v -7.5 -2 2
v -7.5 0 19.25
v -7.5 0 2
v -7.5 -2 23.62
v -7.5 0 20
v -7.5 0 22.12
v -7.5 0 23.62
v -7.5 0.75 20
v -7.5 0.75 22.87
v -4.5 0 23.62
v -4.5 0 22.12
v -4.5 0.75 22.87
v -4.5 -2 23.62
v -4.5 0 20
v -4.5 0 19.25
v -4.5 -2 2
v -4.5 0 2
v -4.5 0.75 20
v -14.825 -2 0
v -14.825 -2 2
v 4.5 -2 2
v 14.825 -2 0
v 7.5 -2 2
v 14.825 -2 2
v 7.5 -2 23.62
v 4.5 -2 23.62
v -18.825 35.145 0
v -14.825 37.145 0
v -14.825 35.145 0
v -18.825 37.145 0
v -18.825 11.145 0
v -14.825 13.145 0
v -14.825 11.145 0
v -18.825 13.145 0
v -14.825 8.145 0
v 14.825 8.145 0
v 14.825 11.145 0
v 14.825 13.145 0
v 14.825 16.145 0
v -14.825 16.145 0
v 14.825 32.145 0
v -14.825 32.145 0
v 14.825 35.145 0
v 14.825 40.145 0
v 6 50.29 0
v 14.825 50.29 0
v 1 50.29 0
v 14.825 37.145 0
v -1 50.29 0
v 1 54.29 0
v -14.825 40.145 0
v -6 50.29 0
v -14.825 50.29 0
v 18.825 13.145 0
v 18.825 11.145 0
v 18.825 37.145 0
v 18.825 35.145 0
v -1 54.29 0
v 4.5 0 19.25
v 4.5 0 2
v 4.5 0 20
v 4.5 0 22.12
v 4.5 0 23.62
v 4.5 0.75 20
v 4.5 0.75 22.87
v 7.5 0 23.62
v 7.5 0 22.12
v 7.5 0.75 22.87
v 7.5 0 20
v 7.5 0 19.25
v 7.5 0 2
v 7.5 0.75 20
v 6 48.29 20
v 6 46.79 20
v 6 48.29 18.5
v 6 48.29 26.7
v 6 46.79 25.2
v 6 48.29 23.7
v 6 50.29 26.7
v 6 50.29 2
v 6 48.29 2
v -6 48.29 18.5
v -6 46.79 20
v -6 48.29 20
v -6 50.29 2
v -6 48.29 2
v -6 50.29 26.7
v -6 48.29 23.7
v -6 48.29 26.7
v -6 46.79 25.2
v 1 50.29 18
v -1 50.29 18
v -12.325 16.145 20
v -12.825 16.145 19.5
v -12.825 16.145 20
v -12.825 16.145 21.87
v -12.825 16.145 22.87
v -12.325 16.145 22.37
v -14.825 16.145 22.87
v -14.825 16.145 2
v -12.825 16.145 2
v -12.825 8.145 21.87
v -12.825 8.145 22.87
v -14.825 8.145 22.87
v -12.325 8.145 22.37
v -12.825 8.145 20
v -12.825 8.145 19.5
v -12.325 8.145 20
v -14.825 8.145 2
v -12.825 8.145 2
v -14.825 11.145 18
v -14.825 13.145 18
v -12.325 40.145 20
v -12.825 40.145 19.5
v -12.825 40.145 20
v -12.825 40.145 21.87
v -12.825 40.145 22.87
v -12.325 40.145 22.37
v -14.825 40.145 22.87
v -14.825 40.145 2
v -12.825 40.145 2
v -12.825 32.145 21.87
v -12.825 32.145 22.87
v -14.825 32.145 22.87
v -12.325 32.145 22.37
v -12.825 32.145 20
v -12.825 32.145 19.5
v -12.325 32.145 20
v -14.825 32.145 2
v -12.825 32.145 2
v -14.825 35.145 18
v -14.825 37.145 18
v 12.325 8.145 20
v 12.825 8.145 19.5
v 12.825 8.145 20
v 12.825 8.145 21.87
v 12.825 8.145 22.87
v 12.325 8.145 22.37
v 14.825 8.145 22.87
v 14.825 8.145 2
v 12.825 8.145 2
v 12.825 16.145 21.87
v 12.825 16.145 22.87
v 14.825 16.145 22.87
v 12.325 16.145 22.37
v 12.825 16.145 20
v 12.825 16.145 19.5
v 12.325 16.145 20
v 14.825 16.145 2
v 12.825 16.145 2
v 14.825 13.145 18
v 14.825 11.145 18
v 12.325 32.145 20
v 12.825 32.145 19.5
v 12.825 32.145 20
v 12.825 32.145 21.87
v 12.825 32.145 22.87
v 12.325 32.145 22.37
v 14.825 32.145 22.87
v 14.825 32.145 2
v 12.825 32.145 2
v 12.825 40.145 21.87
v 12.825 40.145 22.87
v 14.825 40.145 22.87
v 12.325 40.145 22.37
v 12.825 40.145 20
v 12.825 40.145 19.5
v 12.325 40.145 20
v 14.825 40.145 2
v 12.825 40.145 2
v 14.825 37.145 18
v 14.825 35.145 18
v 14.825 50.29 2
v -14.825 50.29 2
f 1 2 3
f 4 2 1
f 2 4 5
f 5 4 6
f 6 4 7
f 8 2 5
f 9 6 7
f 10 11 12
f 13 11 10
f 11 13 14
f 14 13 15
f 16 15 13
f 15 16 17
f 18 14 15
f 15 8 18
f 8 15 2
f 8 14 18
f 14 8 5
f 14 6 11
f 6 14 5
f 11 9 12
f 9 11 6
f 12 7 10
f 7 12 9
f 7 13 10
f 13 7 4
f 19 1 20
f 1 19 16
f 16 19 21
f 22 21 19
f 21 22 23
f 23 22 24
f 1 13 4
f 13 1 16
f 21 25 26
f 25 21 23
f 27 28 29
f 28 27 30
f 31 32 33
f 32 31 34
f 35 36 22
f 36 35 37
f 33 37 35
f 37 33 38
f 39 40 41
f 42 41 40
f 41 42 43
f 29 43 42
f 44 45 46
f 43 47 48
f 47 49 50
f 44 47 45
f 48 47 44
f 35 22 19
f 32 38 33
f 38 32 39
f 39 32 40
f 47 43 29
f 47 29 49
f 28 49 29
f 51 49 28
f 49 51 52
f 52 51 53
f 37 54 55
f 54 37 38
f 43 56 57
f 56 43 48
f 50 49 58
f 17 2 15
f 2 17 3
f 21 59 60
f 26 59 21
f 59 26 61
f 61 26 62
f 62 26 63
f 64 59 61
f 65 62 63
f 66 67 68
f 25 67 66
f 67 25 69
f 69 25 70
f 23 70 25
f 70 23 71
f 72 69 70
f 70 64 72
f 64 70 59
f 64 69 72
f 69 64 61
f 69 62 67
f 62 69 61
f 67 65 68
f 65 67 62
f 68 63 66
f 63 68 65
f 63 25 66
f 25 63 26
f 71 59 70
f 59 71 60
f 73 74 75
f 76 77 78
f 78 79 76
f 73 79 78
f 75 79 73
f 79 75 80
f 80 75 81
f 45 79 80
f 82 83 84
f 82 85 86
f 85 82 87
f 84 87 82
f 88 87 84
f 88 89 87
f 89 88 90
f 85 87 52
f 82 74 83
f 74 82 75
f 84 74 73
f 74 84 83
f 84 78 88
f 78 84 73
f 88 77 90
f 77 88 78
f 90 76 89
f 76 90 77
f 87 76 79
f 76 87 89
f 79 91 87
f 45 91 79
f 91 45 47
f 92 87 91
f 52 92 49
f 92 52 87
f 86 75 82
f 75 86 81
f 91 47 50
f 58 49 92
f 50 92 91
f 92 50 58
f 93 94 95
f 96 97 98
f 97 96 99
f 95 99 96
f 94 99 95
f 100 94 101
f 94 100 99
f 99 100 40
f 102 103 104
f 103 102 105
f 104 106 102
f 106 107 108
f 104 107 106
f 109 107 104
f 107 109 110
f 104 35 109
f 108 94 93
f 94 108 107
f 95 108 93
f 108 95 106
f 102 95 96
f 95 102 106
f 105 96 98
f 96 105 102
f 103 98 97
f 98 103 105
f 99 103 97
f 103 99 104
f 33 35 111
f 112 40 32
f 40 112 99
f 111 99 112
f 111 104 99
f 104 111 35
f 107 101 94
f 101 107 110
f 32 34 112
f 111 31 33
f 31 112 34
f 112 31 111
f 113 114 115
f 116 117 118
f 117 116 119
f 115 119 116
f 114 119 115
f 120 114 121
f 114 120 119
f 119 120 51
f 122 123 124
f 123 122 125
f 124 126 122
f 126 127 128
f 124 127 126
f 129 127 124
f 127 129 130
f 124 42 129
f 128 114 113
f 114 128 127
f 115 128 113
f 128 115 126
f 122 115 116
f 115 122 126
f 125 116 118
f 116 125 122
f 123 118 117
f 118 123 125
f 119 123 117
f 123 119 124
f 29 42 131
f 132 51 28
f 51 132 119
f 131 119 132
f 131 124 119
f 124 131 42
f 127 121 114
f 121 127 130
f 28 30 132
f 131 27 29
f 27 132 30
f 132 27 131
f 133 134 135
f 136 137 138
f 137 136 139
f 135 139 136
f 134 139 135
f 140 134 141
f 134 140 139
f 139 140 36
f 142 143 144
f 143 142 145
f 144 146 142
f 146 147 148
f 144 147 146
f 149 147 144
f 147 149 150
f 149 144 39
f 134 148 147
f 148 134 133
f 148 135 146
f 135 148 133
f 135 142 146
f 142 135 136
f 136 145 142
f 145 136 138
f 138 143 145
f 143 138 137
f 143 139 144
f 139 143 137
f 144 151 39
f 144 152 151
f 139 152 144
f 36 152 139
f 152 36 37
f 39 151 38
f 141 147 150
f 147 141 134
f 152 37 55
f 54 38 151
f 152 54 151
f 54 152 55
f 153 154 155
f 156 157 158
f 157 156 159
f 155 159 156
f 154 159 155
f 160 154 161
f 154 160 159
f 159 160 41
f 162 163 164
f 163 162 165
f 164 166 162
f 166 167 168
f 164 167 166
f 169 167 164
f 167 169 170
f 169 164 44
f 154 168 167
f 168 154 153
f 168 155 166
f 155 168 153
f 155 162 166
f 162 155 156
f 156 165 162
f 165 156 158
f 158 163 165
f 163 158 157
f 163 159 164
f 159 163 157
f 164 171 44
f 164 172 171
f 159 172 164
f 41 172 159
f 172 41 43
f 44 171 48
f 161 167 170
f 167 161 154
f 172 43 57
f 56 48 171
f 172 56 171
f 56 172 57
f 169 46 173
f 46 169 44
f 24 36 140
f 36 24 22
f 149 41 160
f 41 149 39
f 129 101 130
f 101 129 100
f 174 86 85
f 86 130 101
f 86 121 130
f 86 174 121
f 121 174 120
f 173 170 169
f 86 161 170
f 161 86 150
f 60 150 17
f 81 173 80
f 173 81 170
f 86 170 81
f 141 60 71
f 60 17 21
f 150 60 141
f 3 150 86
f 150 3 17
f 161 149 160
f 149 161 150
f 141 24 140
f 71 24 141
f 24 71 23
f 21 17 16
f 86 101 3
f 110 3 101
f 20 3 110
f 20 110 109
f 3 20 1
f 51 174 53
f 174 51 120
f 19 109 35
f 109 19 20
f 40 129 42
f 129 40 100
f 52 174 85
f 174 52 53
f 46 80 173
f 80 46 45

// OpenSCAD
pcbThicknessRear = 2.3;
pcbThickness = 1.47;
pcbWidth = 25.45;
pcbLength = 48.09;
rearSnapWidth = 12;
frontSnapWidth = 3;
frontSnapSpacing = 12;
sideSnapWidth = 8;
sideSnapSpacing = 12;
sideTolerance = 0.1;
thicknessTolerance = -0.1;
snapThickness = 2;
sideInset = 0.5;
frontInset = 0.75;
rearInset = 1.5;
baseThickness = 2;
snapSupportWidth = 2;
snapSupportHeight = 18;
snapSupportDepth = 4;

snapHeight = 20;

module dummy() {}

pcbWidth1 = pcbWidth + 2*sideTolerance;
pcbLength1 = pcbLength + 2*sideTolerance;
pcbThickness1 = pcbThickness + thicknessTolerance;
pcbThicknessRear1 = pcbThicknessRear + thicknessTolerance;

module snap(thickness=snapThickness,inset=2,height=snapHeight,pcbThickness=pcbThickness1,width=8,support=false) {
    translate([0,-snapThickness,0])
    rotate([0,0,90])
    translate([0,width/2,0])
    rotate([90,0,0]) {
    linear_extrude(height=width) 
        polygon([[0,0],[thickness,0],[thickness,height-inset],[thickness+inset,height],
    [thickness,height],
    [thickness,height+inset+pcbThickness],[thickness,height+inset+pcbThickness],[thickness+inset,height+inset+pcbThickness+inset],[thickness,height+inset+pcbThickness+inset+inset],[0,height+inset+pcbThickness+inset+inset]]);
        if (support) {
            translate([0,0,width/2-snapSupportWidth/2])
            linear_extrude(height=snapSupportWidth) polygon([[-snapSupportDepth,0],[thickness,0],[thickness,snapSupportHeight],[0,snapSupportHeight]]);
        }
    }
    
}

for (s=[-1,1]) translate([frontSnapSpacing/2*s,0,0]) snap(inset=frontInset,width=frontSnapWidth);
    
translate([0,pcbLength1,0])
rotate([0,0,180])
snap(inset=rearInset,width=rearSnapWidth,pcbThickness=pcbThicknessRear1,support=true);

for (s=[-1,1]) for(t=[-1,1]) translate([s*pcbWidth1/2,pcbLength1/2+t*sideSnapSpacing,0]) rotate([0,0,s*90]) snap(inset=sideInset,width=sideSnapWidth,support=true);
    
translate([-pcbWidth1/2-snapThickness,-snapThickness,0]) 
cube([pcbWidth1+2*snapThickness,pcbLength1+2*snapThickness,baseThickness]);
